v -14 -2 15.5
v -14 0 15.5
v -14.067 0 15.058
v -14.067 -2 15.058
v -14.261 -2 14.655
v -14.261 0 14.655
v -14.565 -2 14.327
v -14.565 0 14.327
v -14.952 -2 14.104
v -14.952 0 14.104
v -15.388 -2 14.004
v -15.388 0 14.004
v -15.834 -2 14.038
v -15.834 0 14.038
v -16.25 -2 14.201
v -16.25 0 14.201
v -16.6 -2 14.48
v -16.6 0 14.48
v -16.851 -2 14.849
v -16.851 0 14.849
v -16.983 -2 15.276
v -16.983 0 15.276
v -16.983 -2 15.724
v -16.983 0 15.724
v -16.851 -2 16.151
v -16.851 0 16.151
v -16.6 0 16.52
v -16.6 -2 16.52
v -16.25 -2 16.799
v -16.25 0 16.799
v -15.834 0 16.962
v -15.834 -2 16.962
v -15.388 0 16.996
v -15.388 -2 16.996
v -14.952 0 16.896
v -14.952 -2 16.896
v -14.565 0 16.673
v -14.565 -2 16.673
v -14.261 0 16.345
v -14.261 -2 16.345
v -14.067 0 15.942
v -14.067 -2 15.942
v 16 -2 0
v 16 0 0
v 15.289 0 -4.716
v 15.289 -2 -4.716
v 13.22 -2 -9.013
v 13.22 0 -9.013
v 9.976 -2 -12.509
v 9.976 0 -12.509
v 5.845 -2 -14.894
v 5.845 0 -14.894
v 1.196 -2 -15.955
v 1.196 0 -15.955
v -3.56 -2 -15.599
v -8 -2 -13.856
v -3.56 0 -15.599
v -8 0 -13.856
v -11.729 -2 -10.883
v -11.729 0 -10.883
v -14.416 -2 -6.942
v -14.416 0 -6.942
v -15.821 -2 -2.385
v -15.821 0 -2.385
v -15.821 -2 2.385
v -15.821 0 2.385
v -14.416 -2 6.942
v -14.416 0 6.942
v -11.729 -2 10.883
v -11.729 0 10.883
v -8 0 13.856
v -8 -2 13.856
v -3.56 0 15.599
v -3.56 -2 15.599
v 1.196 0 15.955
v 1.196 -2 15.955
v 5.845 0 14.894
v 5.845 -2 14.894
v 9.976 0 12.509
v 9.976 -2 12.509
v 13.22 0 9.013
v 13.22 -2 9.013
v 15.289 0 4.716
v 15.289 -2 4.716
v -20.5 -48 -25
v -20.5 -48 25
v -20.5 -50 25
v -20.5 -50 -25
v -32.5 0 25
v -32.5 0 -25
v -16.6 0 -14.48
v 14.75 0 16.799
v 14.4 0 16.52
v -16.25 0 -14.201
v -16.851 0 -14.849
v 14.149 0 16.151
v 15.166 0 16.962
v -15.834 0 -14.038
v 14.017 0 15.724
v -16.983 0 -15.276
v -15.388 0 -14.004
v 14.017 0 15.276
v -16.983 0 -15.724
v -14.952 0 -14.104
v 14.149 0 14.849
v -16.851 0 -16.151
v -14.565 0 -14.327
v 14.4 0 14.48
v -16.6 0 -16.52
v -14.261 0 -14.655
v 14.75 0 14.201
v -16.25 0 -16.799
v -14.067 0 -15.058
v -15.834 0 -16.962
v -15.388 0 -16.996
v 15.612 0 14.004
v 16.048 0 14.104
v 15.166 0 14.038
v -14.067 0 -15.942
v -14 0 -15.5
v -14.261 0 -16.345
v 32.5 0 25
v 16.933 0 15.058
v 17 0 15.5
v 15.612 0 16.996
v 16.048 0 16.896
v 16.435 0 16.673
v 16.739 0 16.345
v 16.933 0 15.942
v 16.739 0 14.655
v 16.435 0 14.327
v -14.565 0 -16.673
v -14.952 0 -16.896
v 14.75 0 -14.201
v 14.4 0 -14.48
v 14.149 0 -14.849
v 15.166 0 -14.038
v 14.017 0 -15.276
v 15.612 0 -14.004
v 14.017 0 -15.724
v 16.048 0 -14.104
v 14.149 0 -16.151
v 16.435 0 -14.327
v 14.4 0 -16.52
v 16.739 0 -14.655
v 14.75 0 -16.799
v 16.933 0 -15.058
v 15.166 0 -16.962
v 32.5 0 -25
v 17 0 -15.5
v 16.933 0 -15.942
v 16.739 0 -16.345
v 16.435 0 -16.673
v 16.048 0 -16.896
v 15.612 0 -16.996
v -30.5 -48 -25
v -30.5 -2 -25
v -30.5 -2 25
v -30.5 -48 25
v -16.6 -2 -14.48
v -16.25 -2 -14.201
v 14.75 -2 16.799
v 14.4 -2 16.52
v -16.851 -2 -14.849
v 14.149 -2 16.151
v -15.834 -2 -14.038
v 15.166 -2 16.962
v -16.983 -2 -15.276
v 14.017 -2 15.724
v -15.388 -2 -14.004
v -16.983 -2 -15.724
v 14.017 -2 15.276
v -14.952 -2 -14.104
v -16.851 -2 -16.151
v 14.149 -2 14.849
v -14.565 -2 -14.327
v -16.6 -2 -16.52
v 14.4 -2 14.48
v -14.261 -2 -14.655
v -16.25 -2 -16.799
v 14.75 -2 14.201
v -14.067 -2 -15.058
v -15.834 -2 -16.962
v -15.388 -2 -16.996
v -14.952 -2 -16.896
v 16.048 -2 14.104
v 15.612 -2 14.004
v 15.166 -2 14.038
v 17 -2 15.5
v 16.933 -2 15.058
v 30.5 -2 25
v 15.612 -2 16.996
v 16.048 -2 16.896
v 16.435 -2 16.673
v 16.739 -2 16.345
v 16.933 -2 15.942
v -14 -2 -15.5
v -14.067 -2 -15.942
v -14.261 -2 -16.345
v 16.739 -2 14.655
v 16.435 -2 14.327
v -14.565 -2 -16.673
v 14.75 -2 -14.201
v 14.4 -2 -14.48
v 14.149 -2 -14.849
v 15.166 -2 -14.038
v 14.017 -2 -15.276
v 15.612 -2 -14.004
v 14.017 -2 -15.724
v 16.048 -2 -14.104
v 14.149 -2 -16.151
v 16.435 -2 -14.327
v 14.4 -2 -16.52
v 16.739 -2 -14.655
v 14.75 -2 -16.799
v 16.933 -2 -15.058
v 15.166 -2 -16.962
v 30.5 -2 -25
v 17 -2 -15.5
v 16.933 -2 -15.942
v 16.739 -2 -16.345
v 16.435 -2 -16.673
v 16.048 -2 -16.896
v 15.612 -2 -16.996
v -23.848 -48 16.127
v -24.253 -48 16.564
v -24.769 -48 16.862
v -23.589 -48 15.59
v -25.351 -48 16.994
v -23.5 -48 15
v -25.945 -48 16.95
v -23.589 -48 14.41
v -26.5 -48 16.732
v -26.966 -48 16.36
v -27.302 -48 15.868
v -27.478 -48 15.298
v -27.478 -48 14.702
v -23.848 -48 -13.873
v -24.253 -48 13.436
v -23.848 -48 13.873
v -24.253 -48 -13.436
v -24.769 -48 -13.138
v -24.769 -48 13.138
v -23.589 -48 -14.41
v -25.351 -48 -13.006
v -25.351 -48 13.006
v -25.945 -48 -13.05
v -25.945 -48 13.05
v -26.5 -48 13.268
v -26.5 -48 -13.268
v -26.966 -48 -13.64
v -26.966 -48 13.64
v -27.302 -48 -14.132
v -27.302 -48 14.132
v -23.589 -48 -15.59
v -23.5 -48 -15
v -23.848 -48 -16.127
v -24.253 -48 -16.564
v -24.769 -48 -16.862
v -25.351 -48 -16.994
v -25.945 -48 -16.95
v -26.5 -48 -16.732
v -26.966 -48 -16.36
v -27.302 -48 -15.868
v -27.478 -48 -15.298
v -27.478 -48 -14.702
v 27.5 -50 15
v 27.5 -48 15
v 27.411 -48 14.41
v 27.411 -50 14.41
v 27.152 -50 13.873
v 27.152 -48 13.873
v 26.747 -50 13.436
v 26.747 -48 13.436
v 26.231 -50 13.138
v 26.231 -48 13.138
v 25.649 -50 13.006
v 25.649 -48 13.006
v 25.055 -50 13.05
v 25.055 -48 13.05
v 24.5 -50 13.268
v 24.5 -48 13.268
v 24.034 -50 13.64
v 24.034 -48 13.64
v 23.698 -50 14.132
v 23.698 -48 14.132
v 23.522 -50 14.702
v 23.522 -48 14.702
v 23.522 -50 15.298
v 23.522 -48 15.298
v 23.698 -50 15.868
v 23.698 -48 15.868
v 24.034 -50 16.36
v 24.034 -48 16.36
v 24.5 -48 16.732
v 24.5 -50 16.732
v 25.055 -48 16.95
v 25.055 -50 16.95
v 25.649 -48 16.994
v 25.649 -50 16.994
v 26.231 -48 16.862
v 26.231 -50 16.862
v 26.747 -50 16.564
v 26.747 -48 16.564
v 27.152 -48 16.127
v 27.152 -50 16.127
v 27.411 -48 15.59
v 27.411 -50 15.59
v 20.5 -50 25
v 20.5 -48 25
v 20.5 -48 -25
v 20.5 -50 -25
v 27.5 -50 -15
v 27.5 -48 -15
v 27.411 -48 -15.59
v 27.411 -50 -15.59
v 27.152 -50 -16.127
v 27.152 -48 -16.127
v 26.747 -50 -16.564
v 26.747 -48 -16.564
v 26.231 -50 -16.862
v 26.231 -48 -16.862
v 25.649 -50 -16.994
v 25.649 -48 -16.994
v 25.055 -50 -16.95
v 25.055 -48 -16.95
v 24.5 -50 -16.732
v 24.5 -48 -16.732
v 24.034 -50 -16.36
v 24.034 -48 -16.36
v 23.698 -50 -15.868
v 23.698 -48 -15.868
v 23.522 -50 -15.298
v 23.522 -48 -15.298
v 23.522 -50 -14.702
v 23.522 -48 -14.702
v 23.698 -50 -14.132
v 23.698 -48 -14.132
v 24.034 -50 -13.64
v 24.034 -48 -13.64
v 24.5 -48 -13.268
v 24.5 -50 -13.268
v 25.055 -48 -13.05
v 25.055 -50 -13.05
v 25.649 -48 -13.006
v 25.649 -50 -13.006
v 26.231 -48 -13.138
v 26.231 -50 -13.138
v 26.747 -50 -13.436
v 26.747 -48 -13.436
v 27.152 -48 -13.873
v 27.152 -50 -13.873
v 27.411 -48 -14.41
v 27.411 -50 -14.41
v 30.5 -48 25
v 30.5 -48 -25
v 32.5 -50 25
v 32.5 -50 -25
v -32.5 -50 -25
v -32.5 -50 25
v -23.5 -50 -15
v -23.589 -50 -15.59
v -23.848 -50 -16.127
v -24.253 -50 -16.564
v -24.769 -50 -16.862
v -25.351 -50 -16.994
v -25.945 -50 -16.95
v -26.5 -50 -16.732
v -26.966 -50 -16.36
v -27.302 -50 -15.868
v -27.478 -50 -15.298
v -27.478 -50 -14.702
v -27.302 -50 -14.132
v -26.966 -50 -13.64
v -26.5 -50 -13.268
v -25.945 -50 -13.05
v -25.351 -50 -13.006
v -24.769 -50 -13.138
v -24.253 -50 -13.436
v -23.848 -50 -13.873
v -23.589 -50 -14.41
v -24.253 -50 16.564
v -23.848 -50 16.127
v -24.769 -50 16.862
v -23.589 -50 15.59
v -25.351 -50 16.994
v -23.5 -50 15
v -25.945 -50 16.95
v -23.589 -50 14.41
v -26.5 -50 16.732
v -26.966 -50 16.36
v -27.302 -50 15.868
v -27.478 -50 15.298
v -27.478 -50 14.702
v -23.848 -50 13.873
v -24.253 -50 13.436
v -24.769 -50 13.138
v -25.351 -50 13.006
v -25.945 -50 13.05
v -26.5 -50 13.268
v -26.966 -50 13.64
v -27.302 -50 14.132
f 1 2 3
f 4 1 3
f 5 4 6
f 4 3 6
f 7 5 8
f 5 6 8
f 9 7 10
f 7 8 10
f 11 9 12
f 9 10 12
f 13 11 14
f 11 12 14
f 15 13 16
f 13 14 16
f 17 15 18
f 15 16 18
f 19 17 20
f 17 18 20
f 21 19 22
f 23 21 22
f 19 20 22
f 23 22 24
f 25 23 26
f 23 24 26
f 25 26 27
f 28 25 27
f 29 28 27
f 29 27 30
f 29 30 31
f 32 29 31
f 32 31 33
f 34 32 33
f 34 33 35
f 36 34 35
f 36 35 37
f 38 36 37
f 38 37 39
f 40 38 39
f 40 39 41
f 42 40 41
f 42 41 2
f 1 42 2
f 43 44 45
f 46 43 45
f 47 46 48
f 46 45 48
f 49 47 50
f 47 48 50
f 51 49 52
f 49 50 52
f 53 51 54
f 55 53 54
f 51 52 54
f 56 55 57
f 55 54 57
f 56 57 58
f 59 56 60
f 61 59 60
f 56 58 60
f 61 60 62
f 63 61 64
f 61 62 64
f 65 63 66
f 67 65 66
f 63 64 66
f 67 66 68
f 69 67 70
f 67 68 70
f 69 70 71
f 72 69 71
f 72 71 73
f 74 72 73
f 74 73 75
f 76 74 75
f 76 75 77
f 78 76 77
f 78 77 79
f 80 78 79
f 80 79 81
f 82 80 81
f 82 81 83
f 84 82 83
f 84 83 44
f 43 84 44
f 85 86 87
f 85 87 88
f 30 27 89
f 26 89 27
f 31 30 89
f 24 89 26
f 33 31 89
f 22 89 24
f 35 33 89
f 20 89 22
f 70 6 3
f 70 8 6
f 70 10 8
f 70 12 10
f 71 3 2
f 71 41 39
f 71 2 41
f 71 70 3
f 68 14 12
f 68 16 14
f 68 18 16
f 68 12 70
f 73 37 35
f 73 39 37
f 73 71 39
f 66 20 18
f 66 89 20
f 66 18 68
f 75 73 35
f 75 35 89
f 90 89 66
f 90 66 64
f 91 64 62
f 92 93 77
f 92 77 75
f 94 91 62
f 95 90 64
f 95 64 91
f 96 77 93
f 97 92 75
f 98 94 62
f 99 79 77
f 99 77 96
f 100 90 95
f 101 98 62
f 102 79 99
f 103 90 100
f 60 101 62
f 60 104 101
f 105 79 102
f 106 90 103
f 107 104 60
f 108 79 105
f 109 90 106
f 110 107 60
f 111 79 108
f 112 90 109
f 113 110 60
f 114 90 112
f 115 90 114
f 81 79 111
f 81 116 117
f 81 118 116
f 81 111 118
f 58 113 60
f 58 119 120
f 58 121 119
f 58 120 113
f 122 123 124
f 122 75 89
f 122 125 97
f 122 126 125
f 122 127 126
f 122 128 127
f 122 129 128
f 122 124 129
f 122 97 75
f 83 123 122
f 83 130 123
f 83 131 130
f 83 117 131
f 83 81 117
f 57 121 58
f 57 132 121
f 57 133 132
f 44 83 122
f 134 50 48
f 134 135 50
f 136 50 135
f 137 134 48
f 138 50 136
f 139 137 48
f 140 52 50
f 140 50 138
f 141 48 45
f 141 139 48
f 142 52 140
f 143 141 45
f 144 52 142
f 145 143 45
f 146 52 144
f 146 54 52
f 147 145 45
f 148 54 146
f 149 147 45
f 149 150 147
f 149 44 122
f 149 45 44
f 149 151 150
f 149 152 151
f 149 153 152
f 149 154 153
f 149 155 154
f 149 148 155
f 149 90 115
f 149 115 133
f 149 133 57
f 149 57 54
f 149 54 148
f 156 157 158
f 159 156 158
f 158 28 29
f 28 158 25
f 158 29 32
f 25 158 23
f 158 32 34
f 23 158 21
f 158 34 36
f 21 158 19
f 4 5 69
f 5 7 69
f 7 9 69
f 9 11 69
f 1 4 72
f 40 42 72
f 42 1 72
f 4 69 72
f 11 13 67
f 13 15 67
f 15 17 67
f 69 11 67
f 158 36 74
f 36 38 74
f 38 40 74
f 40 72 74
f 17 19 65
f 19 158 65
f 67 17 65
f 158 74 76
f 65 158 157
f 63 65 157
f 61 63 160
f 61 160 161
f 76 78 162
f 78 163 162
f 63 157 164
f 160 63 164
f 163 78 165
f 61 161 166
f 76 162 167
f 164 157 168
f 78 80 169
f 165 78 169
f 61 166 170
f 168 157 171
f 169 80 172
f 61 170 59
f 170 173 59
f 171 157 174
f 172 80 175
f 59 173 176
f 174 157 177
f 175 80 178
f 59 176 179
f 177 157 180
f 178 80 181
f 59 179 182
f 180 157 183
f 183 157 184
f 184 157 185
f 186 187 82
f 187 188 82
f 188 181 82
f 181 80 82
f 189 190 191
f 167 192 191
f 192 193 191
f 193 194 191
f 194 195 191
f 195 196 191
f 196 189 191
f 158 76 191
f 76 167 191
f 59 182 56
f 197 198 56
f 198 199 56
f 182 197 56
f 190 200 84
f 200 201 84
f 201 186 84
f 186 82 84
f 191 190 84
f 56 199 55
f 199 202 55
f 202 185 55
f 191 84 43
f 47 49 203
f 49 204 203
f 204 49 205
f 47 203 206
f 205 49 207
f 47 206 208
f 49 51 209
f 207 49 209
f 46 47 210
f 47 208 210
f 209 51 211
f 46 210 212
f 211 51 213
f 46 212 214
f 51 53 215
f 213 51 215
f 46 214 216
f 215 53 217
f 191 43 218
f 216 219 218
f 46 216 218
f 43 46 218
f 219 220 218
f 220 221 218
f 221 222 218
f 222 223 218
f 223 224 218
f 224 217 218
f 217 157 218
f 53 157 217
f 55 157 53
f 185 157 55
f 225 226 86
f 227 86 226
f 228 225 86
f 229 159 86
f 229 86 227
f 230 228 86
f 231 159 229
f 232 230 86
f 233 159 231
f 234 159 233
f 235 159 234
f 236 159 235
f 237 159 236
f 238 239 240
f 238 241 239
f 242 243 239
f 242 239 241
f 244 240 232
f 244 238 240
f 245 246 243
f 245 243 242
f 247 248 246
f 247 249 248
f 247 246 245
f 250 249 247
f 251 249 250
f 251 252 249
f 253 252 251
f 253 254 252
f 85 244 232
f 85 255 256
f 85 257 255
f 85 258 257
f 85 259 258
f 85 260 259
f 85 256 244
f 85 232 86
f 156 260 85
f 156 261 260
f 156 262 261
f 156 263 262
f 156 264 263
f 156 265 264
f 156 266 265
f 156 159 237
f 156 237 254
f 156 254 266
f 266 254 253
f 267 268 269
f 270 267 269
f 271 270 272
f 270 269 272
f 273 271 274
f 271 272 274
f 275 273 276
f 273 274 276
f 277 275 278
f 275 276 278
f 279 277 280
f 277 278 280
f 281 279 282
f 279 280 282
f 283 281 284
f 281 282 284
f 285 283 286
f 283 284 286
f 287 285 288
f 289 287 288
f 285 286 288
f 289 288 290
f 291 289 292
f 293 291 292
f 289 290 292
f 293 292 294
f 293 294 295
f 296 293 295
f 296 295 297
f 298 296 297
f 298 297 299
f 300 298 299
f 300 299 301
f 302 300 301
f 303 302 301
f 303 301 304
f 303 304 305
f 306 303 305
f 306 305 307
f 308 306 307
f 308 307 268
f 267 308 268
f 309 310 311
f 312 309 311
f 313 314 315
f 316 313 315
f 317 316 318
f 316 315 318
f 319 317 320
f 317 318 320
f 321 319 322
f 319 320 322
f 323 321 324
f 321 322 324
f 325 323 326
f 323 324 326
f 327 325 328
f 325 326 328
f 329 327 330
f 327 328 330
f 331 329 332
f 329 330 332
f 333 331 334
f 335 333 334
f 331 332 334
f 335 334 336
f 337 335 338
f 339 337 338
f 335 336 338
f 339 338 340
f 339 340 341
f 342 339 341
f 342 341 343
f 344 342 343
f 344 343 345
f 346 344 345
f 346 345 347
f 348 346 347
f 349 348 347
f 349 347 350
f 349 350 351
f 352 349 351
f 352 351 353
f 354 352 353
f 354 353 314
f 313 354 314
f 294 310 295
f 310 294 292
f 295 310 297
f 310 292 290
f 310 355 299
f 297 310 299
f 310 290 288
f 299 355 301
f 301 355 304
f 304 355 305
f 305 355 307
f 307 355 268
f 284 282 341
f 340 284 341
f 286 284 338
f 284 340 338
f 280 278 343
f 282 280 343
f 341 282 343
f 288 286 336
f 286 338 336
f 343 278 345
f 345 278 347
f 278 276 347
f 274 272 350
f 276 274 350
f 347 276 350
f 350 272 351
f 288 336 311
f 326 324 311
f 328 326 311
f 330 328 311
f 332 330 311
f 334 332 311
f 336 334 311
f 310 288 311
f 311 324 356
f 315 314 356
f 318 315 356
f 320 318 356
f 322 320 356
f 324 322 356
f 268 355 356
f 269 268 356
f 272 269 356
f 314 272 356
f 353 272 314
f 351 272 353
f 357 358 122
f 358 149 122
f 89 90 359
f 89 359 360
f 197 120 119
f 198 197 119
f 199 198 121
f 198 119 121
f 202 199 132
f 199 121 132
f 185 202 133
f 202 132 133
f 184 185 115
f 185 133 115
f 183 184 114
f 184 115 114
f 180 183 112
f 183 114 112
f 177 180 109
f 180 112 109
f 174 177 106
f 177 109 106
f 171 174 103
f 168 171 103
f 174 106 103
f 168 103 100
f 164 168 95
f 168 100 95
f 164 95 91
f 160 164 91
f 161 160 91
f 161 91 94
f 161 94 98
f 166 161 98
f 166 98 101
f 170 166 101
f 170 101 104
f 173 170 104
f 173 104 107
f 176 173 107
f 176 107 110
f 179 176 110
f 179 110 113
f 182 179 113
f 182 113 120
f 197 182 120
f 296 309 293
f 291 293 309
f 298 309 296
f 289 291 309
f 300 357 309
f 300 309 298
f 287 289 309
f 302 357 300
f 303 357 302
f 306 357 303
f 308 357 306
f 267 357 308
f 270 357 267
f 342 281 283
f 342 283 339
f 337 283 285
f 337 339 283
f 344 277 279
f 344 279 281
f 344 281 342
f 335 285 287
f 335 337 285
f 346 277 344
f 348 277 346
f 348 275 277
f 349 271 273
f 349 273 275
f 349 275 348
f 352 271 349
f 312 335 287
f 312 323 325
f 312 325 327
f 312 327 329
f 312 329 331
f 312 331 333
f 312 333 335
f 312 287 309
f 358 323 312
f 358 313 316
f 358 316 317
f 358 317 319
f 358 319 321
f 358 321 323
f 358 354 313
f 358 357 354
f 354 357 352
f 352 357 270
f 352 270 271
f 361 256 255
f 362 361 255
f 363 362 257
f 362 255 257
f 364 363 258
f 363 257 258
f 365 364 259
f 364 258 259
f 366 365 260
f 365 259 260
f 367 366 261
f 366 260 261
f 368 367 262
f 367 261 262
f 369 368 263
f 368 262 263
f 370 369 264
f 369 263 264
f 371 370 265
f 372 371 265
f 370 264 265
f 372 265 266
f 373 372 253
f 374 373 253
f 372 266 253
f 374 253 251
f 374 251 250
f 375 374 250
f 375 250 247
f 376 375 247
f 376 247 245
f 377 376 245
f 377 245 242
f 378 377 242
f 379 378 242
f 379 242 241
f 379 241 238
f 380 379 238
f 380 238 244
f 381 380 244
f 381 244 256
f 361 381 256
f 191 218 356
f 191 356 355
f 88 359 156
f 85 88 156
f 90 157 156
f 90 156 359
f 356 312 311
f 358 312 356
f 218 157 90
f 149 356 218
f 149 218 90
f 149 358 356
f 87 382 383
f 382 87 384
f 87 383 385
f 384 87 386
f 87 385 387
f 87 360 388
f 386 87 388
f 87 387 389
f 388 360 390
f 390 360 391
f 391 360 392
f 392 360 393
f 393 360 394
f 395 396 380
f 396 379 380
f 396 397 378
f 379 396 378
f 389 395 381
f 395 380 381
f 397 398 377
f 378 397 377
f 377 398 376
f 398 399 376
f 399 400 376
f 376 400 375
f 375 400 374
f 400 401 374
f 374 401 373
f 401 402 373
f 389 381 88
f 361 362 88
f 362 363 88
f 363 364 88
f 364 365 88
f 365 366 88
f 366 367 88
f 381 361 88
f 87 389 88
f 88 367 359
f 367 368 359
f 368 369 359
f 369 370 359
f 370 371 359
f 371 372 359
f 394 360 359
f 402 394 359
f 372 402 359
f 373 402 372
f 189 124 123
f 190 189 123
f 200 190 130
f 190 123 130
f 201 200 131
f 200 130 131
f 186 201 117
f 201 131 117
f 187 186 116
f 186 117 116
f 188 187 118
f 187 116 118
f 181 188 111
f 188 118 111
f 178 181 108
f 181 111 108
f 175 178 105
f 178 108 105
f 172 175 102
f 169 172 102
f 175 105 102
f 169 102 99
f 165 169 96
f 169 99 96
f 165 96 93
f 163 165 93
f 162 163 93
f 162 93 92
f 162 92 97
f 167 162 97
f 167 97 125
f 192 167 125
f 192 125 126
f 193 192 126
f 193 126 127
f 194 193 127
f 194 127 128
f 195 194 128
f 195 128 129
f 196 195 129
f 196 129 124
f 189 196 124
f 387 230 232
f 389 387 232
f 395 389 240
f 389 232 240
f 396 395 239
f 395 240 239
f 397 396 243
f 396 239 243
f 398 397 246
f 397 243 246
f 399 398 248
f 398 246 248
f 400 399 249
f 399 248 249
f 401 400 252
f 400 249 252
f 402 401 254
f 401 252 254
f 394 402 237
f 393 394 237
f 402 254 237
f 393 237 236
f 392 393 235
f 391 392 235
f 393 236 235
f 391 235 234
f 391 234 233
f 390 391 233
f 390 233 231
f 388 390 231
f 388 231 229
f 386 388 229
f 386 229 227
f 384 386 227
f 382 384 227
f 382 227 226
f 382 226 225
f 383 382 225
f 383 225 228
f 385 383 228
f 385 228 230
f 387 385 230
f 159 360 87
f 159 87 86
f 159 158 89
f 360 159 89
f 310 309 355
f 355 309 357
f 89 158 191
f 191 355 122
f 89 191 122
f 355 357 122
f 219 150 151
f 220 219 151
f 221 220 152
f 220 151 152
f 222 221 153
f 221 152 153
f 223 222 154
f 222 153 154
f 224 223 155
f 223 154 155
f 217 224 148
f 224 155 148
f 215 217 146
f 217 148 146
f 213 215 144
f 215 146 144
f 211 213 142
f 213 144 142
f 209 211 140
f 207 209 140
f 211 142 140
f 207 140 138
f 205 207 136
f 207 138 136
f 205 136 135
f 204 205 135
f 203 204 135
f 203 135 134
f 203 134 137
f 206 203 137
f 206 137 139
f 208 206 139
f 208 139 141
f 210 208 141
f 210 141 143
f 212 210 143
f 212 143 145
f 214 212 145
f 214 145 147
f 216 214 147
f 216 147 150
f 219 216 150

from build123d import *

# Parameters (mm, degrees)
ESBO_O1_W                = 65
ESBO_O1_H                = 50
RESSALTO_EXTRUS_O1_DEPTH = 2
ESBO_O2_W                = 50
ESBO_O2_H                = 50
RESSALTO_EXTRUS_O2_DEPTH = 2
ESBO_O3_W                = 50
ESBO_O3_H                = 2
RESSALTO_EXTRUS_O3_DEPTH = 10
ESBO_O4_R                = 1.5
CORTE_EXTRUS_O1_DEPTH    = 51
ESBO_O5_R                = 16
ESBO_O5_R_2              = 2.5
CORTE_EXTRUS_O2_DEPTH    = 10
ESBO_O6_R                = 2
CORTE_EXTRUS_O3_DEPTH    = 10


with BuildPart() as part:
    # Esboço1 → Ressalto-extrusão1 (new body)
    with BuildSketch(Plane(origin=(0, 0, 0), x_dir=(1, 0, 0), z_dir=(0, 1, 0))):
        Rectangle(ESBO_O1_W, ESBO_O1_H)
    extrude(amount=-RESSALTO_EXTRUS_O1_DEPTH)

    # Esboço2 → Ressalto-extrusão2 (add)
    with BuildSketch(Plane.ZY.offset(32.5)):
        with Locations((0, -25)):
            Rectangle(ESBO_O2_W, ESBO_O2_H)
    ressalto_extrus_o2 = extrude(amount=-RESSALTO_EXTRUS_O2_DEPTH)

    # Esboço3 → Ressalto-extrusão3 (add)
    with BuildSketch(Plane(origin=(-30.5, 0, 0), x_dir=(0, 0, -1), z_dir=(1, 0, 0))):
        with Locations((0, -49)):
            Rectangle(ESBO_O3_W, ESBO_O3_H)
    ressalto_extrus_o3 = extrude(amount=RESSALTO_EXTRUS_O3_DEPTH)

    # Espelhar1: Ressalto-extrusão2, Ressalto-extrusão3 across plane
    add(ressalto_extrus_o2.mirror(Plane(origin=(0, 0, 0), x_dir=(0, 0, 1), z_dir=(1, 0, 0))))
    add(ressalto_extrus_o3.mirror(Plane(origin=(0, 0, 0), x_dir=(0, 0, 1), z_dir=(1, 0, 0))))

    # Esboço4 → Corte-extrusão1 (cut, through all)
    with BuildSketch(Plane(origin=(0, 0, 0), x_dir=(1, 0, 0), z_dir=(0, 1, 0))):
        with Locations((-15.5, 15.5)):
            Circle(ESBO_O4_R)
        with Locations((-15.5, -15.5)):
            Circle(ESBO_O4_R)
        with Locations((15.5, -15.5)):
            Circle(ESBO_O4_R)
        with Locations((15.5, 15.5)):
            Circle(ESBO_O4_R)
    extrude(amount=-CORTE_EXTRUS_O1_DEPTH, mode=Mode.SUBTRACT)

    # Esboço5 → Corte-extrusão2 (cut)
    with BuildSketch(Plane(origin=(0, 0, 0), x_dir=(1, 0, 0), z_dir=(0, 1, 0))):
        Circle(ESBO_O5_R)
        Circle(ESBO_O5_R_2, mode=Mode.SUBTRACT)
        Circle(ESBO_O5_R_2)
    extrude(amount=-CORTE_EXTRUS_O2_DEPTH, mode=Mode.SUBTRACT)

    # Esboço6 → Corte-extrusão3 (cut)
    with BuildSketch(Plane(origin=(0, -48, 0), x_dir=(1, 0, 0), z_dir=(0, 1, 0))):
        with Locations((-25.5, -15)):
            Circle(ESBO_O6_R)
        with Locations((25.5, -15)):
            Circle(ESBO_O6_R)
        with Locations((25.5, 15)):
            Circle(ESBO_O6_R)
        with Locations((-25.5, 15)):
            Circle(ESBO_O6_R)
    extrude(amount=-CORTE_EXTRUS_O3_DEPTH, mode=Mode.SUBTRACT)


solid = part.part
